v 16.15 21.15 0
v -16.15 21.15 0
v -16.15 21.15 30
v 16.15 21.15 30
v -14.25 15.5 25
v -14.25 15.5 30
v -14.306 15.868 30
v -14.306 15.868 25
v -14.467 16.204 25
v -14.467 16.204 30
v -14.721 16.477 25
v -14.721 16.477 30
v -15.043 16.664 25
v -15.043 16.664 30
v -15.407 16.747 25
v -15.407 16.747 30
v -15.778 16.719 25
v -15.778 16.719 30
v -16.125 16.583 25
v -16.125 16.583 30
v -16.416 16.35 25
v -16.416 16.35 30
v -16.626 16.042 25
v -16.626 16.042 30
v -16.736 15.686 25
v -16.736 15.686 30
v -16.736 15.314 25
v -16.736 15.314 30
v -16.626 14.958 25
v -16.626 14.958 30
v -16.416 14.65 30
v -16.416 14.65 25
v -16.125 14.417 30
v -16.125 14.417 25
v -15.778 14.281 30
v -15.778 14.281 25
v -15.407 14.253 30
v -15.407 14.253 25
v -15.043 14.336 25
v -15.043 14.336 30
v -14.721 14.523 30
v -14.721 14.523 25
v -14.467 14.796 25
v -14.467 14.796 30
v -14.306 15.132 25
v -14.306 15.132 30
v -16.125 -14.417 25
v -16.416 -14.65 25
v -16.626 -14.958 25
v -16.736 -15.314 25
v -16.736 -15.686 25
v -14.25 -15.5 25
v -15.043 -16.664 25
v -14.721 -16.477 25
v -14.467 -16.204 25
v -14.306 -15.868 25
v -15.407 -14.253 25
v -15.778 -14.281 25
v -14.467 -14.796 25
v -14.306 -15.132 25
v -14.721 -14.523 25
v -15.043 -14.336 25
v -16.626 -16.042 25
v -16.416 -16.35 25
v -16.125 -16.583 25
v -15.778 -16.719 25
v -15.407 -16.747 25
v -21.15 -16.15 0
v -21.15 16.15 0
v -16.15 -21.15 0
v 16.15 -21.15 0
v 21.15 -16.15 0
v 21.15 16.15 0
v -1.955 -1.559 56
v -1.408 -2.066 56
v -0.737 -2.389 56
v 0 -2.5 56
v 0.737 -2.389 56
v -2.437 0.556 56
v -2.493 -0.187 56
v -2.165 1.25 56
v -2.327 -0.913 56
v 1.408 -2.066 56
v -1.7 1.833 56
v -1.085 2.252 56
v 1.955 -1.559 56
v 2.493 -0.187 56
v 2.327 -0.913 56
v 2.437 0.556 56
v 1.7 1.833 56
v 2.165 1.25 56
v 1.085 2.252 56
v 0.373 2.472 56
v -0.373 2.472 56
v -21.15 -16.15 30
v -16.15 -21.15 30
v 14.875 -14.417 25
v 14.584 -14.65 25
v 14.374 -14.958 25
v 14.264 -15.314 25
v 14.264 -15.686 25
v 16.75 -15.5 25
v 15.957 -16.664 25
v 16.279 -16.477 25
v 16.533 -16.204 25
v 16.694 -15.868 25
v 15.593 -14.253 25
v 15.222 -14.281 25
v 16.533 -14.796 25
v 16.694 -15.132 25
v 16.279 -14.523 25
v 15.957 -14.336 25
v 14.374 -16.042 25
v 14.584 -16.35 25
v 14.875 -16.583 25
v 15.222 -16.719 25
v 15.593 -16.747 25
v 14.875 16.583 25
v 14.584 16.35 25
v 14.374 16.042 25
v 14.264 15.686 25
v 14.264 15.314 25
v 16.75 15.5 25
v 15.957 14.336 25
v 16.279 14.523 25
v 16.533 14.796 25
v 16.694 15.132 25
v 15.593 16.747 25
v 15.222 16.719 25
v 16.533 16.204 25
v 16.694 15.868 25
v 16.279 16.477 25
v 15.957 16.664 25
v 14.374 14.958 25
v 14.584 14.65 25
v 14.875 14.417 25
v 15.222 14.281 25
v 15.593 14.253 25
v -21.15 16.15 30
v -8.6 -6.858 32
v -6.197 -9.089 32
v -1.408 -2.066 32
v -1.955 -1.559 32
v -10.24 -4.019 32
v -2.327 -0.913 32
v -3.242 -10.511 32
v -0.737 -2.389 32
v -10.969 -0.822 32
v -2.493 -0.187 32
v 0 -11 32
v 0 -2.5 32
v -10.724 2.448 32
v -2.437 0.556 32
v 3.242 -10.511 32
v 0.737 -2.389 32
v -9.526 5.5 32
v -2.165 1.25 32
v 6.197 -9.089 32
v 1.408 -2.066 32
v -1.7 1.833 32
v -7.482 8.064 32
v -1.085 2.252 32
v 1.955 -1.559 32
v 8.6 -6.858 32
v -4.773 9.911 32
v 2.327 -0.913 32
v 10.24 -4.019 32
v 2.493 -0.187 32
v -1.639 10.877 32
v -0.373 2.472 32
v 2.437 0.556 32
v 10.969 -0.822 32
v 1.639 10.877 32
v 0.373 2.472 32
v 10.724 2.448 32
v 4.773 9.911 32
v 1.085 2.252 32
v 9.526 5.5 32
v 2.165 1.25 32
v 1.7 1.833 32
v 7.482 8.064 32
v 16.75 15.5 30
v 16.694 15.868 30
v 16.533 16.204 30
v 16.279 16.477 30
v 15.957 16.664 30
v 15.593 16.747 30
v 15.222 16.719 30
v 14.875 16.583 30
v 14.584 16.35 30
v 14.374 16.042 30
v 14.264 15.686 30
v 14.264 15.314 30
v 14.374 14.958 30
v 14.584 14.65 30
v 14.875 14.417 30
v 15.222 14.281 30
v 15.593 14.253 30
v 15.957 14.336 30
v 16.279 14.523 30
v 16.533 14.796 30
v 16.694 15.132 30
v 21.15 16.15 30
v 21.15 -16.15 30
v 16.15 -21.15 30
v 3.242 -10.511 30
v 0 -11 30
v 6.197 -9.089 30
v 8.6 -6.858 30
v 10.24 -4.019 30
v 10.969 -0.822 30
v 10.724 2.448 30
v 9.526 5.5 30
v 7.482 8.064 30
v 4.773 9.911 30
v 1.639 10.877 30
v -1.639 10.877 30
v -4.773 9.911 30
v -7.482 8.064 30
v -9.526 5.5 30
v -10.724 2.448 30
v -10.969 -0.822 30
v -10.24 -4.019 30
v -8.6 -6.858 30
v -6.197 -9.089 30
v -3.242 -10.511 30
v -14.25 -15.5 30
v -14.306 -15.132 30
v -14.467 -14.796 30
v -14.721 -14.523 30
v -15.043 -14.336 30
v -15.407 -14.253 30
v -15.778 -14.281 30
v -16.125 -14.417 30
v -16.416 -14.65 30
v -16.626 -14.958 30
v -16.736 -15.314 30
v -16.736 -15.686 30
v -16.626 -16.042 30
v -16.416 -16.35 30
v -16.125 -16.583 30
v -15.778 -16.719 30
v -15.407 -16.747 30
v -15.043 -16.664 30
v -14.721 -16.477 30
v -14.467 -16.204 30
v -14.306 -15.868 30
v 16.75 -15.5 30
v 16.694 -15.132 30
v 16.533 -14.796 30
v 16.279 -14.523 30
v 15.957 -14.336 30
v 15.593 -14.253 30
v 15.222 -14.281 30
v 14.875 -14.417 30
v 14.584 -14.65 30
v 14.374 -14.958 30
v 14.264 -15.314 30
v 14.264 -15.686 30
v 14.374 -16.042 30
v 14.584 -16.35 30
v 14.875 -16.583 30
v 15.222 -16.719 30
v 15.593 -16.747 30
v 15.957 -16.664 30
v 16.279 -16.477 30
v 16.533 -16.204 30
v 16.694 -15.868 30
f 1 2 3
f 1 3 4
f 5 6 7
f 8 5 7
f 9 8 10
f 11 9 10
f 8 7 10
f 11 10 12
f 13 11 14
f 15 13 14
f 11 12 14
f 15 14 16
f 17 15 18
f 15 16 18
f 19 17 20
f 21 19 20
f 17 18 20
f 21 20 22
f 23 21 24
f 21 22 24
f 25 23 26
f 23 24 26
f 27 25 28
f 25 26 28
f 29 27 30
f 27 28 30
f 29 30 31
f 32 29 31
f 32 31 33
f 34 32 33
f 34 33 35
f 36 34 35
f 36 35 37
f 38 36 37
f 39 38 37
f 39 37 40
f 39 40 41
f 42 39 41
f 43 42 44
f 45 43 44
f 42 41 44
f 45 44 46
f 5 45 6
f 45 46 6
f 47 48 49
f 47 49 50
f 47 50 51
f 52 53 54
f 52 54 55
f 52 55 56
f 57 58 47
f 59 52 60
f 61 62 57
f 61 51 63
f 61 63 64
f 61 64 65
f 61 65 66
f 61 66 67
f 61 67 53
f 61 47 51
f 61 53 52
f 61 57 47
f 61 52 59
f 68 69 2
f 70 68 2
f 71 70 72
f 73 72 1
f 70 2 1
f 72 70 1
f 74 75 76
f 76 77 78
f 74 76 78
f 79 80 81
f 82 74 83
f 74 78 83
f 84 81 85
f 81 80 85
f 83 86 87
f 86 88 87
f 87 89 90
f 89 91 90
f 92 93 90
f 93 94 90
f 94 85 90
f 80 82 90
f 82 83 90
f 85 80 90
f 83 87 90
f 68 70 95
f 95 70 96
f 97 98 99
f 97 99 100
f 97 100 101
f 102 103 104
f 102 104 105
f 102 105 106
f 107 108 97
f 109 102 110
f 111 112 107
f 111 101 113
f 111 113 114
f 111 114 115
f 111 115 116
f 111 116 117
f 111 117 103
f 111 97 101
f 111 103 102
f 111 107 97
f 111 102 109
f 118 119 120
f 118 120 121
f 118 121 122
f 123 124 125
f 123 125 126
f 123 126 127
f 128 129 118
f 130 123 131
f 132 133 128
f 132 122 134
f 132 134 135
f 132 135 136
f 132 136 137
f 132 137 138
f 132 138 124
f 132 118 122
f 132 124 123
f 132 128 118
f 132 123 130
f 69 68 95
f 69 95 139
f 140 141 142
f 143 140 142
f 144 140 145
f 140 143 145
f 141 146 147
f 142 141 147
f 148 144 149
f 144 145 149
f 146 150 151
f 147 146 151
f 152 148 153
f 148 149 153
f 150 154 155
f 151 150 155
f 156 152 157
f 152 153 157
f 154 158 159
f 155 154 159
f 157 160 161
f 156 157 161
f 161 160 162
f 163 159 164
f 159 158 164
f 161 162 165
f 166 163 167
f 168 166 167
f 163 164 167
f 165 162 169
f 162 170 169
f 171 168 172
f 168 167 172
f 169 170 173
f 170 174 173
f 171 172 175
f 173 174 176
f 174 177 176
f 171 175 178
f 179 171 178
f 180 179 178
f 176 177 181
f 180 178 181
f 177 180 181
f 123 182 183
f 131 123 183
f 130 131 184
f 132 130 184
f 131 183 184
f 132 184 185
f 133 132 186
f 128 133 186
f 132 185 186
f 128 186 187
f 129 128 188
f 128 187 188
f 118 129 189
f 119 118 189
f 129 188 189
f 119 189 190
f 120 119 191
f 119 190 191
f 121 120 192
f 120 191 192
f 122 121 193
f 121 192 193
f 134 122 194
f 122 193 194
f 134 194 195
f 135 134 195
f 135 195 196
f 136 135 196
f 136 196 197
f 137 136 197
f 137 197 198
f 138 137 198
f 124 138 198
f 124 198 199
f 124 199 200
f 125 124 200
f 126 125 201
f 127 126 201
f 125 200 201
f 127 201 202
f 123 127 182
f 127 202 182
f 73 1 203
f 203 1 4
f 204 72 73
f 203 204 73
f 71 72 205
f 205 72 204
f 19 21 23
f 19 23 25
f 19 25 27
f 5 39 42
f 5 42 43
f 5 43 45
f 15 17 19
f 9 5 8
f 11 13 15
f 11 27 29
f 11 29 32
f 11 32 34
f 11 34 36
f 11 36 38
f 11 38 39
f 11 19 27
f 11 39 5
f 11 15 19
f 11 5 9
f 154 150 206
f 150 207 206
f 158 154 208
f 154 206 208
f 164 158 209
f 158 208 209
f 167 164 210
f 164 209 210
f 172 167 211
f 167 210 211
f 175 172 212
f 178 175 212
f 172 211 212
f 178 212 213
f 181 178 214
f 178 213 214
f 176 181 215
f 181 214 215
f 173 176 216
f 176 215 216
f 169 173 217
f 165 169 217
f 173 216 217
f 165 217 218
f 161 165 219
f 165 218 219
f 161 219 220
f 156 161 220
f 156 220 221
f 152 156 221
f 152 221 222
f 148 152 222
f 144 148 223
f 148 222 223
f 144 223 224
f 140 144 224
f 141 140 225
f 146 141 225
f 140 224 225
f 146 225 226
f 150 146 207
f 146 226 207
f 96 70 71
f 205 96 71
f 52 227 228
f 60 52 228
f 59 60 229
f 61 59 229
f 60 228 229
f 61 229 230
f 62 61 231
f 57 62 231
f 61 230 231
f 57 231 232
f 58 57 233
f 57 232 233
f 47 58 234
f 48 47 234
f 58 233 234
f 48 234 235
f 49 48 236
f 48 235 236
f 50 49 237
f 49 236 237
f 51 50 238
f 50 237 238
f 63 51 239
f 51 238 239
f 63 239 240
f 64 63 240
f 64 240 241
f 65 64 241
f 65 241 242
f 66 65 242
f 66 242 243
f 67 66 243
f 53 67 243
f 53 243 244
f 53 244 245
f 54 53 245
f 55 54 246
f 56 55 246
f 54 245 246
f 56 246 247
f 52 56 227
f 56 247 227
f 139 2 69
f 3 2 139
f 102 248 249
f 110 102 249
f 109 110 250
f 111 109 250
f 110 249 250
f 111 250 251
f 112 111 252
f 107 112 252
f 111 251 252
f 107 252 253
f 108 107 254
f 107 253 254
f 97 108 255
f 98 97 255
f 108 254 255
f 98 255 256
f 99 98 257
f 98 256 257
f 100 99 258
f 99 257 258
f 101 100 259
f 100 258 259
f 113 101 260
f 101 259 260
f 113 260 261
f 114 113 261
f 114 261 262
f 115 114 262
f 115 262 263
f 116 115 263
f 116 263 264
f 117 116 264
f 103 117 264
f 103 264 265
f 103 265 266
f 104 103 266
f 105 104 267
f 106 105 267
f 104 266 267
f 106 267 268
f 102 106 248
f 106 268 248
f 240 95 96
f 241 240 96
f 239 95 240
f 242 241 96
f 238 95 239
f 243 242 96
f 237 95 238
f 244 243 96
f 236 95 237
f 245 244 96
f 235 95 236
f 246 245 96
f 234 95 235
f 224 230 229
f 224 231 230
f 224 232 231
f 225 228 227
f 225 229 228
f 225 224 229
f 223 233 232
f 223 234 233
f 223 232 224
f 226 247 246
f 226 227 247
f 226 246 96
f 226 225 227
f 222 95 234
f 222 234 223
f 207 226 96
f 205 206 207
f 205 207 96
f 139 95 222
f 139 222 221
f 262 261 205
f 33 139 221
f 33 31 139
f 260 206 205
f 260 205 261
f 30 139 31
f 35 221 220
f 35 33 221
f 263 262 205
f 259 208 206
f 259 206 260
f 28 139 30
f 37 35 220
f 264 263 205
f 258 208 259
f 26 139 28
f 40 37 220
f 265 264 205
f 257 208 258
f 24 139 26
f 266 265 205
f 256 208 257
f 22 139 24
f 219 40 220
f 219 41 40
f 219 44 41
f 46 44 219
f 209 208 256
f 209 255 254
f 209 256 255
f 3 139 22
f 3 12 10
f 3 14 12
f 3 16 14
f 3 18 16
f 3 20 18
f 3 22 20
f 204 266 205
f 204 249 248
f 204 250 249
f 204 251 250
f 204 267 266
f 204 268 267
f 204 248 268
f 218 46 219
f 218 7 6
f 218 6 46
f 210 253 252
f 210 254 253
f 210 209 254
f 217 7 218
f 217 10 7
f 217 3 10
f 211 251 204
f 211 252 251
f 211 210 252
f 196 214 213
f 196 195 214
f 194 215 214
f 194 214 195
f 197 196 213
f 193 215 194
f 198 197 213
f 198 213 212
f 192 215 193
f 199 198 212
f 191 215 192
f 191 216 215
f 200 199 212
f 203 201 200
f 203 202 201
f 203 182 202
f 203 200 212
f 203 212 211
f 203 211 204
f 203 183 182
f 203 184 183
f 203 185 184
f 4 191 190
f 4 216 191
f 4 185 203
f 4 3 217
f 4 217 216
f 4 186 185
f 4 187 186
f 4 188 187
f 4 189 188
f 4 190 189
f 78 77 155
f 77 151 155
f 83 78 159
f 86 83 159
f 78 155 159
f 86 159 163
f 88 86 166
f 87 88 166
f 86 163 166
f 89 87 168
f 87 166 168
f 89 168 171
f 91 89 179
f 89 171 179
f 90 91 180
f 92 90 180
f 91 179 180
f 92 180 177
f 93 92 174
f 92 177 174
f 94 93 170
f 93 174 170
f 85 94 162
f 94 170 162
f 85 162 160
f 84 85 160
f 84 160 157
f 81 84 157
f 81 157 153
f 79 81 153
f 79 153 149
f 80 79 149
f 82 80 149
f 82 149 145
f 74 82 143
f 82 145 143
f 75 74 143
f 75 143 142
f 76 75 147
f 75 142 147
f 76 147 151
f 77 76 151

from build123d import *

# Parameters (mm, degrees)
F0_W     = 42.3
F0_H     = 42.3
F1_DEPTH = 30
F2_SIZE  = 5
F5_R     = 1.25
F6_DEPTH = 5


with BuildPart() as f1:
    # F0 (on Top) → F1 (new body)
    with BuildSketch(Plane.XY):
        Rectangle(F0_W, F0_H)
    extrude(amount=F1_DEPTH)

    # F2
    f2_edges = [f1.edges().sort_by_distance(p)[0] for p in [
        (21.15, -21.15, 15),
        (-21.15, -21.15, 15),
        (-21.15, 21.15, 15),
        (21.15, 21.15, 15),
    ]]
    chamfer(f2_edges, length=F2_SIZE)

    # F3 (on Right) → F4 (revolve)
    with BuildSketch(Plane.YZ):
        Polygon((-11, 30), (0, 30), (0, 56), (-2.5, 56), (-2.5, 32), (-11, 32), align=None)
    revolve(axis=Axis((0, 0, 43), (0, 0, 1)))

    # F5 (on face) → F6 (cut)
    with BuildSketch(Plane.XY.offset(30)):
        with Locations((-15.5, 15.5)):
            Circle(F5_R)
        with Locations((15.5, 15.5)):
            Circle(F5_R)
        with Locations((15.5, -15.5)):
            Circle(F5_R)
        with Locations((-15.5, -15.5)):
            Circle(F5_R)
    extrude(amount=-F6_DEPTH, mode=Mode.SUBTRACT)


solid = f1.part
